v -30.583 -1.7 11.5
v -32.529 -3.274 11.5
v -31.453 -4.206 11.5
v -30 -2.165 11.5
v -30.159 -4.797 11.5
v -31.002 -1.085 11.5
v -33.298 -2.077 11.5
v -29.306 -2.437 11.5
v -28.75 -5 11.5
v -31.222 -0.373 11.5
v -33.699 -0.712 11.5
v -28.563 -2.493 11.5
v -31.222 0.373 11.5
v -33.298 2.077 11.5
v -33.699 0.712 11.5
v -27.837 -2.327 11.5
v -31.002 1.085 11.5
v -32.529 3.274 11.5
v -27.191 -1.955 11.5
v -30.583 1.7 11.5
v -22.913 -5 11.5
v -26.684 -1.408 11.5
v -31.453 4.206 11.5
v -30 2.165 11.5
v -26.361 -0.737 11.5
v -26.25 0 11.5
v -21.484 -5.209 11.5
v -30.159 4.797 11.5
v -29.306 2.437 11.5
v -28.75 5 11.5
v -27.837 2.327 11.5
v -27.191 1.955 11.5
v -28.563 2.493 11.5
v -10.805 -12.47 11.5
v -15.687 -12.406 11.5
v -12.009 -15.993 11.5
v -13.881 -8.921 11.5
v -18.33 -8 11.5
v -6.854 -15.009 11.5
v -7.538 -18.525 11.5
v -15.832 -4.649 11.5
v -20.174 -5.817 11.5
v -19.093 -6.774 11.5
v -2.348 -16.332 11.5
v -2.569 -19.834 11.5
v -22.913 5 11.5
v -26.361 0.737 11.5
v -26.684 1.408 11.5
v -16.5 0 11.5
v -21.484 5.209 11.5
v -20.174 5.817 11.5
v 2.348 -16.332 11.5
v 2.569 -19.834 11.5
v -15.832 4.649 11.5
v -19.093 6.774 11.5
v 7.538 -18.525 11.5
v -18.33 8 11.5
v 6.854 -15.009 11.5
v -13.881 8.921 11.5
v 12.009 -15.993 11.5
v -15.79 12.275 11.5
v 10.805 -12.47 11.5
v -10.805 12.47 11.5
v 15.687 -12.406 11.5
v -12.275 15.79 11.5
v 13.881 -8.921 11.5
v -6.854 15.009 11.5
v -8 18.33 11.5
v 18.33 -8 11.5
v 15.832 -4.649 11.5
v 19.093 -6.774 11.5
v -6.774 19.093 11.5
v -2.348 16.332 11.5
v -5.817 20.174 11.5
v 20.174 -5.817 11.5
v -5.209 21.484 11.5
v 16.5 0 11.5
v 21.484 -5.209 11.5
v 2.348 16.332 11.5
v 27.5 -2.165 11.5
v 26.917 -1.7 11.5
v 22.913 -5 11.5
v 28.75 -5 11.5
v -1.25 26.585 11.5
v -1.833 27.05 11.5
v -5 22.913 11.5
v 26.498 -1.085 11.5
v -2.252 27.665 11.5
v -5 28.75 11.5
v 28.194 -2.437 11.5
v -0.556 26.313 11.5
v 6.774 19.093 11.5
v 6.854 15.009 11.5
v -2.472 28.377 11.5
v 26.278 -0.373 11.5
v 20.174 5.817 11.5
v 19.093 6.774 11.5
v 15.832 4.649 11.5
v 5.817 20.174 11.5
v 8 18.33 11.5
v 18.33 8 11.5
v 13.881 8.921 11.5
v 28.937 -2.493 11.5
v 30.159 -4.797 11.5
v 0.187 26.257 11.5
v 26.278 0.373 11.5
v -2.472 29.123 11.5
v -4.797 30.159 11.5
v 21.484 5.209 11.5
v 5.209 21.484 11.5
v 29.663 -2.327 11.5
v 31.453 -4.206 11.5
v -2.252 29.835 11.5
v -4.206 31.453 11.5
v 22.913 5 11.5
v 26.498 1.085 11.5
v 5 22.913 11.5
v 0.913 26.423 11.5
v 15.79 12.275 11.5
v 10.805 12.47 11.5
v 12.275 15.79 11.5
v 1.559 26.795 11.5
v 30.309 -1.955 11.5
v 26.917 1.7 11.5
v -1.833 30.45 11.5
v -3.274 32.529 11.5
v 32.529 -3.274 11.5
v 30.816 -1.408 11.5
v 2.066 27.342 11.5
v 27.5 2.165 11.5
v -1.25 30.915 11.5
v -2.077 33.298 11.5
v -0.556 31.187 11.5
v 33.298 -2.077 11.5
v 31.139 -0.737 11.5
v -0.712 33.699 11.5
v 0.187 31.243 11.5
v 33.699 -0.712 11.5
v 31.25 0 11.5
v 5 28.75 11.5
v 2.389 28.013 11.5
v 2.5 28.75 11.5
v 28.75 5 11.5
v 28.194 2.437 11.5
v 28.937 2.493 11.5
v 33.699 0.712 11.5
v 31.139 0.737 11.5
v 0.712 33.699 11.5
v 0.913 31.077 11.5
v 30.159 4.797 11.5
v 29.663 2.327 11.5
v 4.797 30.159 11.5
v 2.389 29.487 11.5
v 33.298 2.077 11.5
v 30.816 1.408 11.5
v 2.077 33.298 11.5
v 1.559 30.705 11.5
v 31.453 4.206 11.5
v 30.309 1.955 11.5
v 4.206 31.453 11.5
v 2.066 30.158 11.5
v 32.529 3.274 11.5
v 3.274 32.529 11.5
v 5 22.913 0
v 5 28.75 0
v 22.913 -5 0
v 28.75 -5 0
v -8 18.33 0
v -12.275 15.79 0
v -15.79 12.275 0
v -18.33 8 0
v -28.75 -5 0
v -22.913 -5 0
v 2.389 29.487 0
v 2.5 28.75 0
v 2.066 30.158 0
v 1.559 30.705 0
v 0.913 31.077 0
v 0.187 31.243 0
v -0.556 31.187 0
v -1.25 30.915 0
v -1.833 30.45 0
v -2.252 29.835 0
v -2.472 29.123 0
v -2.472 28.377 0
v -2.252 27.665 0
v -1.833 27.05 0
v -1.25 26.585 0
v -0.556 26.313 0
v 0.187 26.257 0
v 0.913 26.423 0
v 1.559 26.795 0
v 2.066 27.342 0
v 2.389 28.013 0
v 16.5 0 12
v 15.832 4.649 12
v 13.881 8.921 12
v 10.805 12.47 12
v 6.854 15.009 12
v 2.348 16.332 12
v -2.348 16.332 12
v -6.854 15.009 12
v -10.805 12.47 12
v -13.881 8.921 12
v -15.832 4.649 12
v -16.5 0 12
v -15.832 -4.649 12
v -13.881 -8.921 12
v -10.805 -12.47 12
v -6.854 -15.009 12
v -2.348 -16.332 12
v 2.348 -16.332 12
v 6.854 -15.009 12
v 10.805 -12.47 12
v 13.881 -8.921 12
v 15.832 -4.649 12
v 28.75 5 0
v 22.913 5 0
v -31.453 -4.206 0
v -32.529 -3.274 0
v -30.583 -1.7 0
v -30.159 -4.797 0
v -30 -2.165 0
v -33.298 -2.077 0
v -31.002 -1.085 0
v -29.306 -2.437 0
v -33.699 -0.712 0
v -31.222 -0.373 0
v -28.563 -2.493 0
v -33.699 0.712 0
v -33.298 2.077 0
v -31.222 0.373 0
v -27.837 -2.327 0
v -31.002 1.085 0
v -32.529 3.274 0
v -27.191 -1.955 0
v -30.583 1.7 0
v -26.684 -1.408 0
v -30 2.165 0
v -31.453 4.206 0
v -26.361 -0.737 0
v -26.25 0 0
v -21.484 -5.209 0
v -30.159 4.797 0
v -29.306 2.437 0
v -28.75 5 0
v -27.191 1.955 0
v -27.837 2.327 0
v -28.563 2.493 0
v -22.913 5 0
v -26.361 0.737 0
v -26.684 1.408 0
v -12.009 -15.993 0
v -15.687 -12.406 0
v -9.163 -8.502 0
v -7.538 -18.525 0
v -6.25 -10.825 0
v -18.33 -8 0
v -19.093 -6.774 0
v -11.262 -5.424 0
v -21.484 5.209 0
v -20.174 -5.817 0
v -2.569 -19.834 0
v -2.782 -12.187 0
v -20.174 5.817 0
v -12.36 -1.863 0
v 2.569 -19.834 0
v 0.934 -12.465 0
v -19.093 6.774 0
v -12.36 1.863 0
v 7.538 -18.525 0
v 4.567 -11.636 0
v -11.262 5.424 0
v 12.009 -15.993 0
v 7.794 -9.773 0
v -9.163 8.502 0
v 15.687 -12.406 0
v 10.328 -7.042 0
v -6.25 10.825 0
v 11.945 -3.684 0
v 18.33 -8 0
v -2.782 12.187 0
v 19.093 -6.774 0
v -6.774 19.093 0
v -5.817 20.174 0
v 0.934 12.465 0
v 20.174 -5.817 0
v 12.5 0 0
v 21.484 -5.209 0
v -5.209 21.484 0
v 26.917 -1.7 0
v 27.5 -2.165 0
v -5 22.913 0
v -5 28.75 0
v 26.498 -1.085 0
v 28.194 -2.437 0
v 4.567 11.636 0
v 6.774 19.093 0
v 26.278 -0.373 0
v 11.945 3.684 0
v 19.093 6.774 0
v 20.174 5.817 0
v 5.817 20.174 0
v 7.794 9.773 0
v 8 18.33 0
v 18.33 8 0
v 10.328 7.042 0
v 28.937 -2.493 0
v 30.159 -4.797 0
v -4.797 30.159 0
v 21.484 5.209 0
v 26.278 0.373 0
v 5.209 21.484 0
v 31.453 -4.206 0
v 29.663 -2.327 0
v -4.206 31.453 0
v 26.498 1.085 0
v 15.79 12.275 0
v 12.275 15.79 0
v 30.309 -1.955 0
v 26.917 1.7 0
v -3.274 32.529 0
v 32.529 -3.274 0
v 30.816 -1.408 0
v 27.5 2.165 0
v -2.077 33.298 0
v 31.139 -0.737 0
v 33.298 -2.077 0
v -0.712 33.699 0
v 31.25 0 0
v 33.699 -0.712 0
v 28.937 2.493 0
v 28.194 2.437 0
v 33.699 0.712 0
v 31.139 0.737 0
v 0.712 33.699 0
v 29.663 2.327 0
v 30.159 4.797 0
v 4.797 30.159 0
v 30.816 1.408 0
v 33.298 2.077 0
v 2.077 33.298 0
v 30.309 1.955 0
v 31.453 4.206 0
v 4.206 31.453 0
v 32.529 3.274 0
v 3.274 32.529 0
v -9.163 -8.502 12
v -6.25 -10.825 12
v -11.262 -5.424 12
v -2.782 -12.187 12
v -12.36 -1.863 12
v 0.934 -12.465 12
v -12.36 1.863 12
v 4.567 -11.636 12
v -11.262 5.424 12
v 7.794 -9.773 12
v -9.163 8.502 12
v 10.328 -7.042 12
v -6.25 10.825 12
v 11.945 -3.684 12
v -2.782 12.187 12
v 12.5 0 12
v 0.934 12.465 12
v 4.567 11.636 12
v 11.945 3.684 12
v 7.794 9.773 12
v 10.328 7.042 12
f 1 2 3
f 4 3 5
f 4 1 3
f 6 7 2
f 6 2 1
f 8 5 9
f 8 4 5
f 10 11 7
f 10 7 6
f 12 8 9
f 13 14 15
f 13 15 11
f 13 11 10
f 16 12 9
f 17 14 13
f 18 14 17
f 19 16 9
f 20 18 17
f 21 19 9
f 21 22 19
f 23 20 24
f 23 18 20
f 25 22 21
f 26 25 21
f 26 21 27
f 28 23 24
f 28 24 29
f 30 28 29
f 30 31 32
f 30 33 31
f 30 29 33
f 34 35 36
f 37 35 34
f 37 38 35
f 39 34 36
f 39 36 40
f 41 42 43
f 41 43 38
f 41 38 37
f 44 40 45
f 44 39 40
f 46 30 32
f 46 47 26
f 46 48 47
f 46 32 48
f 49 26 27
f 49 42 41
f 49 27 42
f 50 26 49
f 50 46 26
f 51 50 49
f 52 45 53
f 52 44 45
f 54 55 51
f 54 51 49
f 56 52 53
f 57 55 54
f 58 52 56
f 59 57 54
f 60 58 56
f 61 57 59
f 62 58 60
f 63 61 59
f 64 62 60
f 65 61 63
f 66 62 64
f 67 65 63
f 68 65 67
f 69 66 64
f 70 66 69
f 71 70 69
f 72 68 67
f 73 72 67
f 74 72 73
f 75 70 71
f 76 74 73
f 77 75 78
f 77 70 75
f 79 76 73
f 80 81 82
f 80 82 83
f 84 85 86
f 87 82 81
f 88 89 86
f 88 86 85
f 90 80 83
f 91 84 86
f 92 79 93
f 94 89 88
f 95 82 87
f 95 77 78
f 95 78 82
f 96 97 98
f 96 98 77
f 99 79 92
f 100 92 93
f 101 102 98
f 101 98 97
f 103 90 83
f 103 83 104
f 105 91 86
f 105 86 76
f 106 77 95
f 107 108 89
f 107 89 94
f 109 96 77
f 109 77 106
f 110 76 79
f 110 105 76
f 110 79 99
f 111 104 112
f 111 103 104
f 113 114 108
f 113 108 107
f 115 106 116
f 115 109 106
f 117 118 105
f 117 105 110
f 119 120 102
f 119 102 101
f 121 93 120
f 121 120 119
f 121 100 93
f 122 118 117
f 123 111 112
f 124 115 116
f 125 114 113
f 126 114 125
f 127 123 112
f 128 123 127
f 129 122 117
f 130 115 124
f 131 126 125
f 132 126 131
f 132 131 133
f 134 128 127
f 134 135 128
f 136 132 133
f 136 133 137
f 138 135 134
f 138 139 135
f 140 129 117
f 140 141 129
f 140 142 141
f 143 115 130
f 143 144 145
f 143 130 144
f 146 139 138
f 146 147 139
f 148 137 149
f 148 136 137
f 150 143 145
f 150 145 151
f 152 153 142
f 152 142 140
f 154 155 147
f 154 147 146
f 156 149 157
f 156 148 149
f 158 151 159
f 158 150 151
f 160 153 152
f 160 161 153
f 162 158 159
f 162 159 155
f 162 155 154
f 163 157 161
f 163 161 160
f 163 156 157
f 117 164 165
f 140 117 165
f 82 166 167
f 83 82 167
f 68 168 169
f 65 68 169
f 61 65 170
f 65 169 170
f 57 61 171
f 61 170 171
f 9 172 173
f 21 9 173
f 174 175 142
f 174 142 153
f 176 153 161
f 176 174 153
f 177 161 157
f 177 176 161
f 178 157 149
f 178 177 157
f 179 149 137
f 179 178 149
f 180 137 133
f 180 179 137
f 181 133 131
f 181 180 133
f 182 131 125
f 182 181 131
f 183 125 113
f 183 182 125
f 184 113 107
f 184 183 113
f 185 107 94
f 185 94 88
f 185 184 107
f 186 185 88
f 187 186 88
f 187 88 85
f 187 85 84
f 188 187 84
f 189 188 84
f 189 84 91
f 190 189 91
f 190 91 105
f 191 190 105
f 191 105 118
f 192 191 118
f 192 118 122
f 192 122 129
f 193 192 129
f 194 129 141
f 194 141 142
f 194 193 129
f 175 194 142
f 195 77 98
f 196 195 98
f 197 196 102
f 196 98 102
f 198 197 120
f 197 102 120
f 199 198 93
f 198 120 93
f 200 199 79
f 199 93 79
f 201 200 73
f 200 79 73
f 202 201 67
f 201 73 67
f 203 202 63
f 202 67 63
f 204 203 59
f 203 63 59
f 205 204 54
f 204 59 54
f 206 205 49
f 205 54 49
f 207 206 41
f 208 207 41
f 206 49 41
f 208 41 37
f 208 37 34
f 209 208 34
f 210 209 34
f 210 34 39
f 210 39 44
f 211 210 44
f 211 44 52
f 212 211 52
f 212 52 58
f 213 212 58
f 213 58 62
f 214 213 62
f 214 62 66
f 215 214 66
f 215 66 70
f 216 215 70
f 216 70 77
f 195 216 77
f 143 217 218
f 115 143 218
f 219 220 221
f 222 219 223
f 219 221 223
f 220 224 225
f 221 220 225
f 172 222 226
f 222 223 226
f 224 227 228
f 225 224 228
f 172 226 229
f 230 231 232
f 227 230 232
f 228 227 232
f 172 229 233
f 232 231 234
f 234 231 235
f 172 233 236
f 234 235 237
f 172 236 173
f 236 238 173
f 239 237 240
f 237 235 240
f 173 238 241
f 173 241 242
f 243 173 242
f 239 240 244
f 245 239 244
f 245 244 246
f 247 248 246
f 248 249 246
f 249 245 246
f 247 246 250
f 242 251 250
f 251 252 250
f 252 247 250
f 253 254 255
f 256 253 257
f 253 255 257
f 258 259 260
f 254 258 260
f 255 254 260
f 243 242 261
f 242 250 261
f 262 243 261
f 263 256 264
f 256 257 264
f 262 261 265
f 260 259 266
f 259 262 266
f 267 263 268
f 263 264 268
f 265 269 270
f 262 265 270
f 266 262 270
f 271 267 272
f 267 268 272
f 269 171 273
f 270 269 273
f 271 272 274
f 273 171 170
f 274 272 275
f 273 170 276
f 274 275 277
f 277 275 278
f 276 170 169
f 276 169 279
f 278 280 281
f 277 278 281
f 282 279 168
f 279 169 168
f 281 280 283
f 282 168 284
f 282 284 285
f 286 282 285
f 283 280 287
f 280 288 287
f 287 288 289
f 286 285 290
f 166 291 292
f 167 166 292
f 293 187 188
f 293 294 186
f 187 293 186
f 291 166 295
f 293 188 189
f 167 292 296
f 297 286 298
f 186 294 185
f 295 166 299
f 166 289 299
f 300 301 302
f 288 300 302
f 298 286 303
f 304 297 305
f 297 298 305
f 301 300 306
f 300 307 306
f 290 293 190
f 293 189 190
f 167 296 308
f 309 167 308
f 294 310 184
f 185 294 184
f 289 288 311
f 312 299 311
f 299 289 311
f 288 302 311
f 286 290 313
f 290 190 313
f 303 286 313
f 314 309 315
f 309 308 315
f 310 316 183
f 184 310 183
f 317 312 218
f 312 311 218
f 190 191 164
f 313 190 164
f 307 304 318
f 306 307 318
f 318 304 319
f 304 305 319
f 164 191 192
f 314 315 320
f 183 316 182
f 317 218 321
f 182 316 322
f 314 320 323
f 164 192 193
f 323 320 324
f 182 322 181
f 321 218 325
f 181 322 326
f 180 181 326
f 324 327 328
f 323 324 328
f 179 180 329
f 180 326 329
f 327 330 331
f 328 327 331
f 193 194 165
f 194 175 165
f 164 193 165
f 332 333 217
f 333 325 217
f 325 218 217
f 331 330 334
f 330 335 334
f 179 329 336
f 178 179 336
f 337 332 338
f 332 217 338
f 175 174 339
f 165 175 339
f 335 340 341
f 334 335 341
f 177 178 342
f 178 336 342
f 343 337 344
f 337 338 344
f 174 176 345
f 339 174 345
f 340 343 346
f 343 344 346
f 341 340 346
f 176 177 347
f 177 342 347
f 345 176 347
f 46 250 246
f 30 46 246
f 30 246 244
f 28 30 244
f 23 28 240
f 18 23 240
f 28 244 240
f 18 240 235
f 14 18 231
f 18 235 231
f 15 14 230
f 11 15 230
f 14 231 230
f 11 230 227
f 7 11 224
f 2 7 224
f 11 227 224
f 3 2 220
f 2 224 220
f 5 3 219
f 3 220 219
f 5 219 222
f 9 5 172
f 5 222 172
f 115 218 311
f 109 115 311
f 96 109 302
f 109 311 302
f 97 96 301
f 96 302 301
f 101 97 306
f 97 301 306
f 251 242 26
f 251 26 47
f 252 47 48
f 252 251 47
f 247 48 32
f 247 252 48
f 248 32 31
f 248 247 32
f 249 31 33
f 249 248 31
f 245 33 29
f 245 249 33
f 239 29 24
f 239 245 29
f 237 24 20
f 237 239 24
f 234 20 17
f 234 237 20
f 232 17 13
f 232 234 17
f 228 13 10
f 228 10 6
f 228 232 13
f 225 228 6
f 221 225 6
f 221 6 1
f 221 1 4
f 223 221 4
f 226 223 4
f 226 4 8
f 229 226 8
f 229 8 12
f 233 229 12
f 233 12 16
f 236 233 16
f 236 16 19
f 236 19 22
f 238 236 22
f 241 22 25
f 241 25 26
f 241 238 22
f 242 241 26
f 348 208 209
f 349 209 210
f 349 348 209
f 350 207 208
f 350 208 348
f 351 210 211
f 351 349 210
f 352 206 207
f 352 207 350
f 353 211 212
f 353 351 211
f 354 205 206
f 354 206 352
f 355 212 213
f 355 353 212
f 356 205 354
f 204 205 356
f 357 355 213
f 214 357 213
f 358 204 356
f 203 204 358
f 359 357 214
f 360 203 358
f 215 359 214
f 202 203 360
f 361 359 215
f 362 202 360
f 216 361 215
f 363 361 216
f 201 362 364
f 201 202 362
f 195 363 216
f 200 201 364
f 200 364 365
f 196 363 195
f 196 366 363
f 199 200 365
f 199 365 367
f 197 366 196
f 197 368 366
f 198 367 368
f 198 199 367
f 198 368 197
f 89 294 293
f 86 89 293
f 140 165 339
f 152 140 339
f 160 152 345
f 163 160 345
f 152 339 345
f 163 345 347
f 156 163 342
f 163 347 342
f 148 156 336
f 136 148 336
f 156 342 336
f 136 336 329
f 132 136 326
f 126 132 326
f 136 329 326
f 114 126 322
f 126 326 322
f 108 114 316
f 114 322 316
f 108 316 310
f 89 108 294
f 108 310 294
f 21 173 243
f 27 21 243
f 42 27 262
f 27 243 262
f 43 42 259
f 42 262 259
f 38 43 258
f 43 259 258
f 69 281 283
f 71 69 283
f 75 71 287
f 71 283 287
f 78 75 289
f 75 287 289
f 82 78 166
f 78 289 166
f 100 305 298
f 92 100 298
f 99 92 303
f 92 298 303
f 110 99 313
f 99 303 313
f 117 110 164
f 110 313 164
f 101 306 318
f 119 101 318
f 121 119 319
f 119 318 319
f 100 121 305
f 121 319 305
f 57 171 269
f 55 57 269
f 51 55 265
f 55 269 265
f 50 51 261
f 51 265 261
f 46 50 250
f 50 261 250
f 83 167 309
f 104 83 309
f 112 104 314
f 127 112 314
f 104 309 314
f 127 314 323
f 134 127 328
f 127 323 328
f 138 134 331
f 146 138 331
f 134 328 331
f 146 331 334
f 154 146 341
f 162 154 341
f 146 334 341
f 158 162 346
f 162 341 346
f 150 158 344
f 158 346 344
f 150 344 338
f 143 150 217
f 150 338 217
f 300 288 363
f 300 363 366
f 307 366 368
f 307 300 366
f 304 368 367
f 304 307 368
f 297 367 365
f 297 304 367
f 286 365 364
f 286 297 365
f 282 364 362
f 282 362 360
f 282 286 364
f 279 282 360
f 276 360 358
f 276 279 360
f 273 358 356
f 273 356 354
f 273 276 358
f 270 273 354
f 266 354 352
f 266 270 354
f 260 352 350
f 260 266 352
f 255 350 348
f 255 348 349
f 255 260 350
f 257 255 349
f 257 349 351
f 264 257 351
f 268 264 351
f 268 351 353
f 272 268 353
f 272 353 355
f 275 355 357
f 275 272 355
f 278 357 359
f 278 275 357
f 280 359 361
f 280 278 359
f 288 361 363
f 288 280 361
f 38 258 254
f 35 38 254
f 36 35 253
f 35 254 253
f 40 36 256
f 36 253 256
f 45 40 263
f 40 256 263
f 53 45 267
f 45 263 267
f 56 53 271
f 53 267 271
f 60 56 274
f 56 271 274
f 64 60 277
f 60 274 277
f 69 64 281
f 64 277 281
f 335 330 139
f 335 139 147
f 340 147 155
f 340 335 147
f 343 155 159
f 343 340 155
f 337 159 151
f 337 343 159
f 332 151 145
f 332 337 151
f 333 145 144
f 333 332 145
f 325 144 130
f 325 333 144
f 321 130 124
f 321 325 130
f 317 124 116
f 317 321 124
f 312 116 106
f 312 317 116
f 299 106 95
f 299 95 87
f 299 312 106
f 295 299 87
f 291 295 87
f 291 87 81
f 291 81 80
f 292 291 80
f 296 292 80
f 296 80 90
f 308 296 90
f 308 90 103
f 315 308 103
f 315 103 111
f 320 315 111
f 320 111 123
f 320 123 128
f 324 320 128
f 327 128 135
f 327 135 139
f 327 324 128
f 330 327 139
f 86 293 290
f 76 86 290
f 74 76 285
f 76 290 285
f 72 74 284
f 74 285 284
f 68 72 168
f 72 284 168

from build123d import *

# Parameters (mm, degrees)
IZIM1_R                     = 2.5
IZIM1_R_2                   = 16.5
Y_KSEKLIK_EKSTR_ZYON2_DEPTH = 11.5
IZIM1_4_R                   = 16.5
IZIM1_4_R_2                 = 12.5
Y_KSEKLIK_EKSTR_ZYON4_DEPTH = 12


with BuildPart() as part:
    # Çizim1 → Yükseklik-Ekstrüzyon2 (new body)
    with BuildSketch(Plane.XY):
        with BuildLine():
            Line((5, 22.912878475), (5, 28.75))
            ThreePointArc((5, 28.75), (0, 33.75), (-5, 28.75))
            Line((-5, 28.75), (-5, 22.912878475))
            ThreePointArc((-5, 22.912878475), (-5.816699867, 20.174265687), (-8, 18.33030278))
            ThreePointArc((-8, 18.33030278), (-14.142135624, 14.142135624), (-18.33030278, 8))
            ThreePointArc((-18.33030278, 8), (-20.174265687, 5.816699867), (-22.912878475, 5))
            Line((-22.912878475, 5), (-28.75, 5))
            ThreePointArc((-28.75, 5), (-33.75, 0), (-28.75, -5))
            Line((-28.75, -5), (-22.912878475, -5))
            ThreePointArc((-22.912878475, -5), (-20.174265687, -5.816699867), (-18.33030278, -8))
            ThreePointArc((-18.33030278, -8), (-12.975595941, -15.219523973), (-5, -19.364916731))
            ThreePointArc((-5, -19.364916731), (0, -20), (5, -19.364916731))
            ThreePointArc((5, -19.364916731), (12.975595941, -15.219523973), (18.33030278, -8))
            ThreePointArc((18.33030278, -8), (20.174265687, -5.816699867), (22.912878475, -5))
            Line((22.912878475, -5), (28.75, -5))
            ThreePointArc((28.75, -5), (33.75, 0), (28.75, 5))
            Line((28.75, 5), (22.912878475, 5))
            ThreePointArc((22.912878475, 5), (20.174265687, 5.816699867), (18.33030278, 8))
            ThreePointArc((18.33030278, 8), (14.142135624, 14.142135624), (8, 18.33030278))
            ThreePointArc((8, 18.33030278), (5.816699867, 20.174265687), (5, 22.912878475))
        make_face()
        with Locations((-28.75, 0)):
            Circle(IZIM1_R, mode=Mode.SUBTRACT)
        Circle(IZIM1_R_2, mode=Mode.SUBTRACT)
        with Locations((0, 28.75)):
            Circle(IZIM1_R, mode=Mode.SUBTRACT)
        with Locations((28.75, 0)):
            Circle(IZIM1_R, mode=Mode.SUBTRACT)
    extrude(amount=Y_KSEKLIK_EKSTR_ZYON2_DEPTH)

    # Çizim1<4> → Yükseklik-Ekstrüzyon4 (add)
    with BuildSketch(Plane.XY):
        Circle(IZIM1_4_R)
        Circle(IZIM1_4_R_2, mode=Mode.SUBTRACT)
    extrude(amount=Y_KSEKLIK_EKSTR_ZYON4_DEPTH)


solid = part.part
